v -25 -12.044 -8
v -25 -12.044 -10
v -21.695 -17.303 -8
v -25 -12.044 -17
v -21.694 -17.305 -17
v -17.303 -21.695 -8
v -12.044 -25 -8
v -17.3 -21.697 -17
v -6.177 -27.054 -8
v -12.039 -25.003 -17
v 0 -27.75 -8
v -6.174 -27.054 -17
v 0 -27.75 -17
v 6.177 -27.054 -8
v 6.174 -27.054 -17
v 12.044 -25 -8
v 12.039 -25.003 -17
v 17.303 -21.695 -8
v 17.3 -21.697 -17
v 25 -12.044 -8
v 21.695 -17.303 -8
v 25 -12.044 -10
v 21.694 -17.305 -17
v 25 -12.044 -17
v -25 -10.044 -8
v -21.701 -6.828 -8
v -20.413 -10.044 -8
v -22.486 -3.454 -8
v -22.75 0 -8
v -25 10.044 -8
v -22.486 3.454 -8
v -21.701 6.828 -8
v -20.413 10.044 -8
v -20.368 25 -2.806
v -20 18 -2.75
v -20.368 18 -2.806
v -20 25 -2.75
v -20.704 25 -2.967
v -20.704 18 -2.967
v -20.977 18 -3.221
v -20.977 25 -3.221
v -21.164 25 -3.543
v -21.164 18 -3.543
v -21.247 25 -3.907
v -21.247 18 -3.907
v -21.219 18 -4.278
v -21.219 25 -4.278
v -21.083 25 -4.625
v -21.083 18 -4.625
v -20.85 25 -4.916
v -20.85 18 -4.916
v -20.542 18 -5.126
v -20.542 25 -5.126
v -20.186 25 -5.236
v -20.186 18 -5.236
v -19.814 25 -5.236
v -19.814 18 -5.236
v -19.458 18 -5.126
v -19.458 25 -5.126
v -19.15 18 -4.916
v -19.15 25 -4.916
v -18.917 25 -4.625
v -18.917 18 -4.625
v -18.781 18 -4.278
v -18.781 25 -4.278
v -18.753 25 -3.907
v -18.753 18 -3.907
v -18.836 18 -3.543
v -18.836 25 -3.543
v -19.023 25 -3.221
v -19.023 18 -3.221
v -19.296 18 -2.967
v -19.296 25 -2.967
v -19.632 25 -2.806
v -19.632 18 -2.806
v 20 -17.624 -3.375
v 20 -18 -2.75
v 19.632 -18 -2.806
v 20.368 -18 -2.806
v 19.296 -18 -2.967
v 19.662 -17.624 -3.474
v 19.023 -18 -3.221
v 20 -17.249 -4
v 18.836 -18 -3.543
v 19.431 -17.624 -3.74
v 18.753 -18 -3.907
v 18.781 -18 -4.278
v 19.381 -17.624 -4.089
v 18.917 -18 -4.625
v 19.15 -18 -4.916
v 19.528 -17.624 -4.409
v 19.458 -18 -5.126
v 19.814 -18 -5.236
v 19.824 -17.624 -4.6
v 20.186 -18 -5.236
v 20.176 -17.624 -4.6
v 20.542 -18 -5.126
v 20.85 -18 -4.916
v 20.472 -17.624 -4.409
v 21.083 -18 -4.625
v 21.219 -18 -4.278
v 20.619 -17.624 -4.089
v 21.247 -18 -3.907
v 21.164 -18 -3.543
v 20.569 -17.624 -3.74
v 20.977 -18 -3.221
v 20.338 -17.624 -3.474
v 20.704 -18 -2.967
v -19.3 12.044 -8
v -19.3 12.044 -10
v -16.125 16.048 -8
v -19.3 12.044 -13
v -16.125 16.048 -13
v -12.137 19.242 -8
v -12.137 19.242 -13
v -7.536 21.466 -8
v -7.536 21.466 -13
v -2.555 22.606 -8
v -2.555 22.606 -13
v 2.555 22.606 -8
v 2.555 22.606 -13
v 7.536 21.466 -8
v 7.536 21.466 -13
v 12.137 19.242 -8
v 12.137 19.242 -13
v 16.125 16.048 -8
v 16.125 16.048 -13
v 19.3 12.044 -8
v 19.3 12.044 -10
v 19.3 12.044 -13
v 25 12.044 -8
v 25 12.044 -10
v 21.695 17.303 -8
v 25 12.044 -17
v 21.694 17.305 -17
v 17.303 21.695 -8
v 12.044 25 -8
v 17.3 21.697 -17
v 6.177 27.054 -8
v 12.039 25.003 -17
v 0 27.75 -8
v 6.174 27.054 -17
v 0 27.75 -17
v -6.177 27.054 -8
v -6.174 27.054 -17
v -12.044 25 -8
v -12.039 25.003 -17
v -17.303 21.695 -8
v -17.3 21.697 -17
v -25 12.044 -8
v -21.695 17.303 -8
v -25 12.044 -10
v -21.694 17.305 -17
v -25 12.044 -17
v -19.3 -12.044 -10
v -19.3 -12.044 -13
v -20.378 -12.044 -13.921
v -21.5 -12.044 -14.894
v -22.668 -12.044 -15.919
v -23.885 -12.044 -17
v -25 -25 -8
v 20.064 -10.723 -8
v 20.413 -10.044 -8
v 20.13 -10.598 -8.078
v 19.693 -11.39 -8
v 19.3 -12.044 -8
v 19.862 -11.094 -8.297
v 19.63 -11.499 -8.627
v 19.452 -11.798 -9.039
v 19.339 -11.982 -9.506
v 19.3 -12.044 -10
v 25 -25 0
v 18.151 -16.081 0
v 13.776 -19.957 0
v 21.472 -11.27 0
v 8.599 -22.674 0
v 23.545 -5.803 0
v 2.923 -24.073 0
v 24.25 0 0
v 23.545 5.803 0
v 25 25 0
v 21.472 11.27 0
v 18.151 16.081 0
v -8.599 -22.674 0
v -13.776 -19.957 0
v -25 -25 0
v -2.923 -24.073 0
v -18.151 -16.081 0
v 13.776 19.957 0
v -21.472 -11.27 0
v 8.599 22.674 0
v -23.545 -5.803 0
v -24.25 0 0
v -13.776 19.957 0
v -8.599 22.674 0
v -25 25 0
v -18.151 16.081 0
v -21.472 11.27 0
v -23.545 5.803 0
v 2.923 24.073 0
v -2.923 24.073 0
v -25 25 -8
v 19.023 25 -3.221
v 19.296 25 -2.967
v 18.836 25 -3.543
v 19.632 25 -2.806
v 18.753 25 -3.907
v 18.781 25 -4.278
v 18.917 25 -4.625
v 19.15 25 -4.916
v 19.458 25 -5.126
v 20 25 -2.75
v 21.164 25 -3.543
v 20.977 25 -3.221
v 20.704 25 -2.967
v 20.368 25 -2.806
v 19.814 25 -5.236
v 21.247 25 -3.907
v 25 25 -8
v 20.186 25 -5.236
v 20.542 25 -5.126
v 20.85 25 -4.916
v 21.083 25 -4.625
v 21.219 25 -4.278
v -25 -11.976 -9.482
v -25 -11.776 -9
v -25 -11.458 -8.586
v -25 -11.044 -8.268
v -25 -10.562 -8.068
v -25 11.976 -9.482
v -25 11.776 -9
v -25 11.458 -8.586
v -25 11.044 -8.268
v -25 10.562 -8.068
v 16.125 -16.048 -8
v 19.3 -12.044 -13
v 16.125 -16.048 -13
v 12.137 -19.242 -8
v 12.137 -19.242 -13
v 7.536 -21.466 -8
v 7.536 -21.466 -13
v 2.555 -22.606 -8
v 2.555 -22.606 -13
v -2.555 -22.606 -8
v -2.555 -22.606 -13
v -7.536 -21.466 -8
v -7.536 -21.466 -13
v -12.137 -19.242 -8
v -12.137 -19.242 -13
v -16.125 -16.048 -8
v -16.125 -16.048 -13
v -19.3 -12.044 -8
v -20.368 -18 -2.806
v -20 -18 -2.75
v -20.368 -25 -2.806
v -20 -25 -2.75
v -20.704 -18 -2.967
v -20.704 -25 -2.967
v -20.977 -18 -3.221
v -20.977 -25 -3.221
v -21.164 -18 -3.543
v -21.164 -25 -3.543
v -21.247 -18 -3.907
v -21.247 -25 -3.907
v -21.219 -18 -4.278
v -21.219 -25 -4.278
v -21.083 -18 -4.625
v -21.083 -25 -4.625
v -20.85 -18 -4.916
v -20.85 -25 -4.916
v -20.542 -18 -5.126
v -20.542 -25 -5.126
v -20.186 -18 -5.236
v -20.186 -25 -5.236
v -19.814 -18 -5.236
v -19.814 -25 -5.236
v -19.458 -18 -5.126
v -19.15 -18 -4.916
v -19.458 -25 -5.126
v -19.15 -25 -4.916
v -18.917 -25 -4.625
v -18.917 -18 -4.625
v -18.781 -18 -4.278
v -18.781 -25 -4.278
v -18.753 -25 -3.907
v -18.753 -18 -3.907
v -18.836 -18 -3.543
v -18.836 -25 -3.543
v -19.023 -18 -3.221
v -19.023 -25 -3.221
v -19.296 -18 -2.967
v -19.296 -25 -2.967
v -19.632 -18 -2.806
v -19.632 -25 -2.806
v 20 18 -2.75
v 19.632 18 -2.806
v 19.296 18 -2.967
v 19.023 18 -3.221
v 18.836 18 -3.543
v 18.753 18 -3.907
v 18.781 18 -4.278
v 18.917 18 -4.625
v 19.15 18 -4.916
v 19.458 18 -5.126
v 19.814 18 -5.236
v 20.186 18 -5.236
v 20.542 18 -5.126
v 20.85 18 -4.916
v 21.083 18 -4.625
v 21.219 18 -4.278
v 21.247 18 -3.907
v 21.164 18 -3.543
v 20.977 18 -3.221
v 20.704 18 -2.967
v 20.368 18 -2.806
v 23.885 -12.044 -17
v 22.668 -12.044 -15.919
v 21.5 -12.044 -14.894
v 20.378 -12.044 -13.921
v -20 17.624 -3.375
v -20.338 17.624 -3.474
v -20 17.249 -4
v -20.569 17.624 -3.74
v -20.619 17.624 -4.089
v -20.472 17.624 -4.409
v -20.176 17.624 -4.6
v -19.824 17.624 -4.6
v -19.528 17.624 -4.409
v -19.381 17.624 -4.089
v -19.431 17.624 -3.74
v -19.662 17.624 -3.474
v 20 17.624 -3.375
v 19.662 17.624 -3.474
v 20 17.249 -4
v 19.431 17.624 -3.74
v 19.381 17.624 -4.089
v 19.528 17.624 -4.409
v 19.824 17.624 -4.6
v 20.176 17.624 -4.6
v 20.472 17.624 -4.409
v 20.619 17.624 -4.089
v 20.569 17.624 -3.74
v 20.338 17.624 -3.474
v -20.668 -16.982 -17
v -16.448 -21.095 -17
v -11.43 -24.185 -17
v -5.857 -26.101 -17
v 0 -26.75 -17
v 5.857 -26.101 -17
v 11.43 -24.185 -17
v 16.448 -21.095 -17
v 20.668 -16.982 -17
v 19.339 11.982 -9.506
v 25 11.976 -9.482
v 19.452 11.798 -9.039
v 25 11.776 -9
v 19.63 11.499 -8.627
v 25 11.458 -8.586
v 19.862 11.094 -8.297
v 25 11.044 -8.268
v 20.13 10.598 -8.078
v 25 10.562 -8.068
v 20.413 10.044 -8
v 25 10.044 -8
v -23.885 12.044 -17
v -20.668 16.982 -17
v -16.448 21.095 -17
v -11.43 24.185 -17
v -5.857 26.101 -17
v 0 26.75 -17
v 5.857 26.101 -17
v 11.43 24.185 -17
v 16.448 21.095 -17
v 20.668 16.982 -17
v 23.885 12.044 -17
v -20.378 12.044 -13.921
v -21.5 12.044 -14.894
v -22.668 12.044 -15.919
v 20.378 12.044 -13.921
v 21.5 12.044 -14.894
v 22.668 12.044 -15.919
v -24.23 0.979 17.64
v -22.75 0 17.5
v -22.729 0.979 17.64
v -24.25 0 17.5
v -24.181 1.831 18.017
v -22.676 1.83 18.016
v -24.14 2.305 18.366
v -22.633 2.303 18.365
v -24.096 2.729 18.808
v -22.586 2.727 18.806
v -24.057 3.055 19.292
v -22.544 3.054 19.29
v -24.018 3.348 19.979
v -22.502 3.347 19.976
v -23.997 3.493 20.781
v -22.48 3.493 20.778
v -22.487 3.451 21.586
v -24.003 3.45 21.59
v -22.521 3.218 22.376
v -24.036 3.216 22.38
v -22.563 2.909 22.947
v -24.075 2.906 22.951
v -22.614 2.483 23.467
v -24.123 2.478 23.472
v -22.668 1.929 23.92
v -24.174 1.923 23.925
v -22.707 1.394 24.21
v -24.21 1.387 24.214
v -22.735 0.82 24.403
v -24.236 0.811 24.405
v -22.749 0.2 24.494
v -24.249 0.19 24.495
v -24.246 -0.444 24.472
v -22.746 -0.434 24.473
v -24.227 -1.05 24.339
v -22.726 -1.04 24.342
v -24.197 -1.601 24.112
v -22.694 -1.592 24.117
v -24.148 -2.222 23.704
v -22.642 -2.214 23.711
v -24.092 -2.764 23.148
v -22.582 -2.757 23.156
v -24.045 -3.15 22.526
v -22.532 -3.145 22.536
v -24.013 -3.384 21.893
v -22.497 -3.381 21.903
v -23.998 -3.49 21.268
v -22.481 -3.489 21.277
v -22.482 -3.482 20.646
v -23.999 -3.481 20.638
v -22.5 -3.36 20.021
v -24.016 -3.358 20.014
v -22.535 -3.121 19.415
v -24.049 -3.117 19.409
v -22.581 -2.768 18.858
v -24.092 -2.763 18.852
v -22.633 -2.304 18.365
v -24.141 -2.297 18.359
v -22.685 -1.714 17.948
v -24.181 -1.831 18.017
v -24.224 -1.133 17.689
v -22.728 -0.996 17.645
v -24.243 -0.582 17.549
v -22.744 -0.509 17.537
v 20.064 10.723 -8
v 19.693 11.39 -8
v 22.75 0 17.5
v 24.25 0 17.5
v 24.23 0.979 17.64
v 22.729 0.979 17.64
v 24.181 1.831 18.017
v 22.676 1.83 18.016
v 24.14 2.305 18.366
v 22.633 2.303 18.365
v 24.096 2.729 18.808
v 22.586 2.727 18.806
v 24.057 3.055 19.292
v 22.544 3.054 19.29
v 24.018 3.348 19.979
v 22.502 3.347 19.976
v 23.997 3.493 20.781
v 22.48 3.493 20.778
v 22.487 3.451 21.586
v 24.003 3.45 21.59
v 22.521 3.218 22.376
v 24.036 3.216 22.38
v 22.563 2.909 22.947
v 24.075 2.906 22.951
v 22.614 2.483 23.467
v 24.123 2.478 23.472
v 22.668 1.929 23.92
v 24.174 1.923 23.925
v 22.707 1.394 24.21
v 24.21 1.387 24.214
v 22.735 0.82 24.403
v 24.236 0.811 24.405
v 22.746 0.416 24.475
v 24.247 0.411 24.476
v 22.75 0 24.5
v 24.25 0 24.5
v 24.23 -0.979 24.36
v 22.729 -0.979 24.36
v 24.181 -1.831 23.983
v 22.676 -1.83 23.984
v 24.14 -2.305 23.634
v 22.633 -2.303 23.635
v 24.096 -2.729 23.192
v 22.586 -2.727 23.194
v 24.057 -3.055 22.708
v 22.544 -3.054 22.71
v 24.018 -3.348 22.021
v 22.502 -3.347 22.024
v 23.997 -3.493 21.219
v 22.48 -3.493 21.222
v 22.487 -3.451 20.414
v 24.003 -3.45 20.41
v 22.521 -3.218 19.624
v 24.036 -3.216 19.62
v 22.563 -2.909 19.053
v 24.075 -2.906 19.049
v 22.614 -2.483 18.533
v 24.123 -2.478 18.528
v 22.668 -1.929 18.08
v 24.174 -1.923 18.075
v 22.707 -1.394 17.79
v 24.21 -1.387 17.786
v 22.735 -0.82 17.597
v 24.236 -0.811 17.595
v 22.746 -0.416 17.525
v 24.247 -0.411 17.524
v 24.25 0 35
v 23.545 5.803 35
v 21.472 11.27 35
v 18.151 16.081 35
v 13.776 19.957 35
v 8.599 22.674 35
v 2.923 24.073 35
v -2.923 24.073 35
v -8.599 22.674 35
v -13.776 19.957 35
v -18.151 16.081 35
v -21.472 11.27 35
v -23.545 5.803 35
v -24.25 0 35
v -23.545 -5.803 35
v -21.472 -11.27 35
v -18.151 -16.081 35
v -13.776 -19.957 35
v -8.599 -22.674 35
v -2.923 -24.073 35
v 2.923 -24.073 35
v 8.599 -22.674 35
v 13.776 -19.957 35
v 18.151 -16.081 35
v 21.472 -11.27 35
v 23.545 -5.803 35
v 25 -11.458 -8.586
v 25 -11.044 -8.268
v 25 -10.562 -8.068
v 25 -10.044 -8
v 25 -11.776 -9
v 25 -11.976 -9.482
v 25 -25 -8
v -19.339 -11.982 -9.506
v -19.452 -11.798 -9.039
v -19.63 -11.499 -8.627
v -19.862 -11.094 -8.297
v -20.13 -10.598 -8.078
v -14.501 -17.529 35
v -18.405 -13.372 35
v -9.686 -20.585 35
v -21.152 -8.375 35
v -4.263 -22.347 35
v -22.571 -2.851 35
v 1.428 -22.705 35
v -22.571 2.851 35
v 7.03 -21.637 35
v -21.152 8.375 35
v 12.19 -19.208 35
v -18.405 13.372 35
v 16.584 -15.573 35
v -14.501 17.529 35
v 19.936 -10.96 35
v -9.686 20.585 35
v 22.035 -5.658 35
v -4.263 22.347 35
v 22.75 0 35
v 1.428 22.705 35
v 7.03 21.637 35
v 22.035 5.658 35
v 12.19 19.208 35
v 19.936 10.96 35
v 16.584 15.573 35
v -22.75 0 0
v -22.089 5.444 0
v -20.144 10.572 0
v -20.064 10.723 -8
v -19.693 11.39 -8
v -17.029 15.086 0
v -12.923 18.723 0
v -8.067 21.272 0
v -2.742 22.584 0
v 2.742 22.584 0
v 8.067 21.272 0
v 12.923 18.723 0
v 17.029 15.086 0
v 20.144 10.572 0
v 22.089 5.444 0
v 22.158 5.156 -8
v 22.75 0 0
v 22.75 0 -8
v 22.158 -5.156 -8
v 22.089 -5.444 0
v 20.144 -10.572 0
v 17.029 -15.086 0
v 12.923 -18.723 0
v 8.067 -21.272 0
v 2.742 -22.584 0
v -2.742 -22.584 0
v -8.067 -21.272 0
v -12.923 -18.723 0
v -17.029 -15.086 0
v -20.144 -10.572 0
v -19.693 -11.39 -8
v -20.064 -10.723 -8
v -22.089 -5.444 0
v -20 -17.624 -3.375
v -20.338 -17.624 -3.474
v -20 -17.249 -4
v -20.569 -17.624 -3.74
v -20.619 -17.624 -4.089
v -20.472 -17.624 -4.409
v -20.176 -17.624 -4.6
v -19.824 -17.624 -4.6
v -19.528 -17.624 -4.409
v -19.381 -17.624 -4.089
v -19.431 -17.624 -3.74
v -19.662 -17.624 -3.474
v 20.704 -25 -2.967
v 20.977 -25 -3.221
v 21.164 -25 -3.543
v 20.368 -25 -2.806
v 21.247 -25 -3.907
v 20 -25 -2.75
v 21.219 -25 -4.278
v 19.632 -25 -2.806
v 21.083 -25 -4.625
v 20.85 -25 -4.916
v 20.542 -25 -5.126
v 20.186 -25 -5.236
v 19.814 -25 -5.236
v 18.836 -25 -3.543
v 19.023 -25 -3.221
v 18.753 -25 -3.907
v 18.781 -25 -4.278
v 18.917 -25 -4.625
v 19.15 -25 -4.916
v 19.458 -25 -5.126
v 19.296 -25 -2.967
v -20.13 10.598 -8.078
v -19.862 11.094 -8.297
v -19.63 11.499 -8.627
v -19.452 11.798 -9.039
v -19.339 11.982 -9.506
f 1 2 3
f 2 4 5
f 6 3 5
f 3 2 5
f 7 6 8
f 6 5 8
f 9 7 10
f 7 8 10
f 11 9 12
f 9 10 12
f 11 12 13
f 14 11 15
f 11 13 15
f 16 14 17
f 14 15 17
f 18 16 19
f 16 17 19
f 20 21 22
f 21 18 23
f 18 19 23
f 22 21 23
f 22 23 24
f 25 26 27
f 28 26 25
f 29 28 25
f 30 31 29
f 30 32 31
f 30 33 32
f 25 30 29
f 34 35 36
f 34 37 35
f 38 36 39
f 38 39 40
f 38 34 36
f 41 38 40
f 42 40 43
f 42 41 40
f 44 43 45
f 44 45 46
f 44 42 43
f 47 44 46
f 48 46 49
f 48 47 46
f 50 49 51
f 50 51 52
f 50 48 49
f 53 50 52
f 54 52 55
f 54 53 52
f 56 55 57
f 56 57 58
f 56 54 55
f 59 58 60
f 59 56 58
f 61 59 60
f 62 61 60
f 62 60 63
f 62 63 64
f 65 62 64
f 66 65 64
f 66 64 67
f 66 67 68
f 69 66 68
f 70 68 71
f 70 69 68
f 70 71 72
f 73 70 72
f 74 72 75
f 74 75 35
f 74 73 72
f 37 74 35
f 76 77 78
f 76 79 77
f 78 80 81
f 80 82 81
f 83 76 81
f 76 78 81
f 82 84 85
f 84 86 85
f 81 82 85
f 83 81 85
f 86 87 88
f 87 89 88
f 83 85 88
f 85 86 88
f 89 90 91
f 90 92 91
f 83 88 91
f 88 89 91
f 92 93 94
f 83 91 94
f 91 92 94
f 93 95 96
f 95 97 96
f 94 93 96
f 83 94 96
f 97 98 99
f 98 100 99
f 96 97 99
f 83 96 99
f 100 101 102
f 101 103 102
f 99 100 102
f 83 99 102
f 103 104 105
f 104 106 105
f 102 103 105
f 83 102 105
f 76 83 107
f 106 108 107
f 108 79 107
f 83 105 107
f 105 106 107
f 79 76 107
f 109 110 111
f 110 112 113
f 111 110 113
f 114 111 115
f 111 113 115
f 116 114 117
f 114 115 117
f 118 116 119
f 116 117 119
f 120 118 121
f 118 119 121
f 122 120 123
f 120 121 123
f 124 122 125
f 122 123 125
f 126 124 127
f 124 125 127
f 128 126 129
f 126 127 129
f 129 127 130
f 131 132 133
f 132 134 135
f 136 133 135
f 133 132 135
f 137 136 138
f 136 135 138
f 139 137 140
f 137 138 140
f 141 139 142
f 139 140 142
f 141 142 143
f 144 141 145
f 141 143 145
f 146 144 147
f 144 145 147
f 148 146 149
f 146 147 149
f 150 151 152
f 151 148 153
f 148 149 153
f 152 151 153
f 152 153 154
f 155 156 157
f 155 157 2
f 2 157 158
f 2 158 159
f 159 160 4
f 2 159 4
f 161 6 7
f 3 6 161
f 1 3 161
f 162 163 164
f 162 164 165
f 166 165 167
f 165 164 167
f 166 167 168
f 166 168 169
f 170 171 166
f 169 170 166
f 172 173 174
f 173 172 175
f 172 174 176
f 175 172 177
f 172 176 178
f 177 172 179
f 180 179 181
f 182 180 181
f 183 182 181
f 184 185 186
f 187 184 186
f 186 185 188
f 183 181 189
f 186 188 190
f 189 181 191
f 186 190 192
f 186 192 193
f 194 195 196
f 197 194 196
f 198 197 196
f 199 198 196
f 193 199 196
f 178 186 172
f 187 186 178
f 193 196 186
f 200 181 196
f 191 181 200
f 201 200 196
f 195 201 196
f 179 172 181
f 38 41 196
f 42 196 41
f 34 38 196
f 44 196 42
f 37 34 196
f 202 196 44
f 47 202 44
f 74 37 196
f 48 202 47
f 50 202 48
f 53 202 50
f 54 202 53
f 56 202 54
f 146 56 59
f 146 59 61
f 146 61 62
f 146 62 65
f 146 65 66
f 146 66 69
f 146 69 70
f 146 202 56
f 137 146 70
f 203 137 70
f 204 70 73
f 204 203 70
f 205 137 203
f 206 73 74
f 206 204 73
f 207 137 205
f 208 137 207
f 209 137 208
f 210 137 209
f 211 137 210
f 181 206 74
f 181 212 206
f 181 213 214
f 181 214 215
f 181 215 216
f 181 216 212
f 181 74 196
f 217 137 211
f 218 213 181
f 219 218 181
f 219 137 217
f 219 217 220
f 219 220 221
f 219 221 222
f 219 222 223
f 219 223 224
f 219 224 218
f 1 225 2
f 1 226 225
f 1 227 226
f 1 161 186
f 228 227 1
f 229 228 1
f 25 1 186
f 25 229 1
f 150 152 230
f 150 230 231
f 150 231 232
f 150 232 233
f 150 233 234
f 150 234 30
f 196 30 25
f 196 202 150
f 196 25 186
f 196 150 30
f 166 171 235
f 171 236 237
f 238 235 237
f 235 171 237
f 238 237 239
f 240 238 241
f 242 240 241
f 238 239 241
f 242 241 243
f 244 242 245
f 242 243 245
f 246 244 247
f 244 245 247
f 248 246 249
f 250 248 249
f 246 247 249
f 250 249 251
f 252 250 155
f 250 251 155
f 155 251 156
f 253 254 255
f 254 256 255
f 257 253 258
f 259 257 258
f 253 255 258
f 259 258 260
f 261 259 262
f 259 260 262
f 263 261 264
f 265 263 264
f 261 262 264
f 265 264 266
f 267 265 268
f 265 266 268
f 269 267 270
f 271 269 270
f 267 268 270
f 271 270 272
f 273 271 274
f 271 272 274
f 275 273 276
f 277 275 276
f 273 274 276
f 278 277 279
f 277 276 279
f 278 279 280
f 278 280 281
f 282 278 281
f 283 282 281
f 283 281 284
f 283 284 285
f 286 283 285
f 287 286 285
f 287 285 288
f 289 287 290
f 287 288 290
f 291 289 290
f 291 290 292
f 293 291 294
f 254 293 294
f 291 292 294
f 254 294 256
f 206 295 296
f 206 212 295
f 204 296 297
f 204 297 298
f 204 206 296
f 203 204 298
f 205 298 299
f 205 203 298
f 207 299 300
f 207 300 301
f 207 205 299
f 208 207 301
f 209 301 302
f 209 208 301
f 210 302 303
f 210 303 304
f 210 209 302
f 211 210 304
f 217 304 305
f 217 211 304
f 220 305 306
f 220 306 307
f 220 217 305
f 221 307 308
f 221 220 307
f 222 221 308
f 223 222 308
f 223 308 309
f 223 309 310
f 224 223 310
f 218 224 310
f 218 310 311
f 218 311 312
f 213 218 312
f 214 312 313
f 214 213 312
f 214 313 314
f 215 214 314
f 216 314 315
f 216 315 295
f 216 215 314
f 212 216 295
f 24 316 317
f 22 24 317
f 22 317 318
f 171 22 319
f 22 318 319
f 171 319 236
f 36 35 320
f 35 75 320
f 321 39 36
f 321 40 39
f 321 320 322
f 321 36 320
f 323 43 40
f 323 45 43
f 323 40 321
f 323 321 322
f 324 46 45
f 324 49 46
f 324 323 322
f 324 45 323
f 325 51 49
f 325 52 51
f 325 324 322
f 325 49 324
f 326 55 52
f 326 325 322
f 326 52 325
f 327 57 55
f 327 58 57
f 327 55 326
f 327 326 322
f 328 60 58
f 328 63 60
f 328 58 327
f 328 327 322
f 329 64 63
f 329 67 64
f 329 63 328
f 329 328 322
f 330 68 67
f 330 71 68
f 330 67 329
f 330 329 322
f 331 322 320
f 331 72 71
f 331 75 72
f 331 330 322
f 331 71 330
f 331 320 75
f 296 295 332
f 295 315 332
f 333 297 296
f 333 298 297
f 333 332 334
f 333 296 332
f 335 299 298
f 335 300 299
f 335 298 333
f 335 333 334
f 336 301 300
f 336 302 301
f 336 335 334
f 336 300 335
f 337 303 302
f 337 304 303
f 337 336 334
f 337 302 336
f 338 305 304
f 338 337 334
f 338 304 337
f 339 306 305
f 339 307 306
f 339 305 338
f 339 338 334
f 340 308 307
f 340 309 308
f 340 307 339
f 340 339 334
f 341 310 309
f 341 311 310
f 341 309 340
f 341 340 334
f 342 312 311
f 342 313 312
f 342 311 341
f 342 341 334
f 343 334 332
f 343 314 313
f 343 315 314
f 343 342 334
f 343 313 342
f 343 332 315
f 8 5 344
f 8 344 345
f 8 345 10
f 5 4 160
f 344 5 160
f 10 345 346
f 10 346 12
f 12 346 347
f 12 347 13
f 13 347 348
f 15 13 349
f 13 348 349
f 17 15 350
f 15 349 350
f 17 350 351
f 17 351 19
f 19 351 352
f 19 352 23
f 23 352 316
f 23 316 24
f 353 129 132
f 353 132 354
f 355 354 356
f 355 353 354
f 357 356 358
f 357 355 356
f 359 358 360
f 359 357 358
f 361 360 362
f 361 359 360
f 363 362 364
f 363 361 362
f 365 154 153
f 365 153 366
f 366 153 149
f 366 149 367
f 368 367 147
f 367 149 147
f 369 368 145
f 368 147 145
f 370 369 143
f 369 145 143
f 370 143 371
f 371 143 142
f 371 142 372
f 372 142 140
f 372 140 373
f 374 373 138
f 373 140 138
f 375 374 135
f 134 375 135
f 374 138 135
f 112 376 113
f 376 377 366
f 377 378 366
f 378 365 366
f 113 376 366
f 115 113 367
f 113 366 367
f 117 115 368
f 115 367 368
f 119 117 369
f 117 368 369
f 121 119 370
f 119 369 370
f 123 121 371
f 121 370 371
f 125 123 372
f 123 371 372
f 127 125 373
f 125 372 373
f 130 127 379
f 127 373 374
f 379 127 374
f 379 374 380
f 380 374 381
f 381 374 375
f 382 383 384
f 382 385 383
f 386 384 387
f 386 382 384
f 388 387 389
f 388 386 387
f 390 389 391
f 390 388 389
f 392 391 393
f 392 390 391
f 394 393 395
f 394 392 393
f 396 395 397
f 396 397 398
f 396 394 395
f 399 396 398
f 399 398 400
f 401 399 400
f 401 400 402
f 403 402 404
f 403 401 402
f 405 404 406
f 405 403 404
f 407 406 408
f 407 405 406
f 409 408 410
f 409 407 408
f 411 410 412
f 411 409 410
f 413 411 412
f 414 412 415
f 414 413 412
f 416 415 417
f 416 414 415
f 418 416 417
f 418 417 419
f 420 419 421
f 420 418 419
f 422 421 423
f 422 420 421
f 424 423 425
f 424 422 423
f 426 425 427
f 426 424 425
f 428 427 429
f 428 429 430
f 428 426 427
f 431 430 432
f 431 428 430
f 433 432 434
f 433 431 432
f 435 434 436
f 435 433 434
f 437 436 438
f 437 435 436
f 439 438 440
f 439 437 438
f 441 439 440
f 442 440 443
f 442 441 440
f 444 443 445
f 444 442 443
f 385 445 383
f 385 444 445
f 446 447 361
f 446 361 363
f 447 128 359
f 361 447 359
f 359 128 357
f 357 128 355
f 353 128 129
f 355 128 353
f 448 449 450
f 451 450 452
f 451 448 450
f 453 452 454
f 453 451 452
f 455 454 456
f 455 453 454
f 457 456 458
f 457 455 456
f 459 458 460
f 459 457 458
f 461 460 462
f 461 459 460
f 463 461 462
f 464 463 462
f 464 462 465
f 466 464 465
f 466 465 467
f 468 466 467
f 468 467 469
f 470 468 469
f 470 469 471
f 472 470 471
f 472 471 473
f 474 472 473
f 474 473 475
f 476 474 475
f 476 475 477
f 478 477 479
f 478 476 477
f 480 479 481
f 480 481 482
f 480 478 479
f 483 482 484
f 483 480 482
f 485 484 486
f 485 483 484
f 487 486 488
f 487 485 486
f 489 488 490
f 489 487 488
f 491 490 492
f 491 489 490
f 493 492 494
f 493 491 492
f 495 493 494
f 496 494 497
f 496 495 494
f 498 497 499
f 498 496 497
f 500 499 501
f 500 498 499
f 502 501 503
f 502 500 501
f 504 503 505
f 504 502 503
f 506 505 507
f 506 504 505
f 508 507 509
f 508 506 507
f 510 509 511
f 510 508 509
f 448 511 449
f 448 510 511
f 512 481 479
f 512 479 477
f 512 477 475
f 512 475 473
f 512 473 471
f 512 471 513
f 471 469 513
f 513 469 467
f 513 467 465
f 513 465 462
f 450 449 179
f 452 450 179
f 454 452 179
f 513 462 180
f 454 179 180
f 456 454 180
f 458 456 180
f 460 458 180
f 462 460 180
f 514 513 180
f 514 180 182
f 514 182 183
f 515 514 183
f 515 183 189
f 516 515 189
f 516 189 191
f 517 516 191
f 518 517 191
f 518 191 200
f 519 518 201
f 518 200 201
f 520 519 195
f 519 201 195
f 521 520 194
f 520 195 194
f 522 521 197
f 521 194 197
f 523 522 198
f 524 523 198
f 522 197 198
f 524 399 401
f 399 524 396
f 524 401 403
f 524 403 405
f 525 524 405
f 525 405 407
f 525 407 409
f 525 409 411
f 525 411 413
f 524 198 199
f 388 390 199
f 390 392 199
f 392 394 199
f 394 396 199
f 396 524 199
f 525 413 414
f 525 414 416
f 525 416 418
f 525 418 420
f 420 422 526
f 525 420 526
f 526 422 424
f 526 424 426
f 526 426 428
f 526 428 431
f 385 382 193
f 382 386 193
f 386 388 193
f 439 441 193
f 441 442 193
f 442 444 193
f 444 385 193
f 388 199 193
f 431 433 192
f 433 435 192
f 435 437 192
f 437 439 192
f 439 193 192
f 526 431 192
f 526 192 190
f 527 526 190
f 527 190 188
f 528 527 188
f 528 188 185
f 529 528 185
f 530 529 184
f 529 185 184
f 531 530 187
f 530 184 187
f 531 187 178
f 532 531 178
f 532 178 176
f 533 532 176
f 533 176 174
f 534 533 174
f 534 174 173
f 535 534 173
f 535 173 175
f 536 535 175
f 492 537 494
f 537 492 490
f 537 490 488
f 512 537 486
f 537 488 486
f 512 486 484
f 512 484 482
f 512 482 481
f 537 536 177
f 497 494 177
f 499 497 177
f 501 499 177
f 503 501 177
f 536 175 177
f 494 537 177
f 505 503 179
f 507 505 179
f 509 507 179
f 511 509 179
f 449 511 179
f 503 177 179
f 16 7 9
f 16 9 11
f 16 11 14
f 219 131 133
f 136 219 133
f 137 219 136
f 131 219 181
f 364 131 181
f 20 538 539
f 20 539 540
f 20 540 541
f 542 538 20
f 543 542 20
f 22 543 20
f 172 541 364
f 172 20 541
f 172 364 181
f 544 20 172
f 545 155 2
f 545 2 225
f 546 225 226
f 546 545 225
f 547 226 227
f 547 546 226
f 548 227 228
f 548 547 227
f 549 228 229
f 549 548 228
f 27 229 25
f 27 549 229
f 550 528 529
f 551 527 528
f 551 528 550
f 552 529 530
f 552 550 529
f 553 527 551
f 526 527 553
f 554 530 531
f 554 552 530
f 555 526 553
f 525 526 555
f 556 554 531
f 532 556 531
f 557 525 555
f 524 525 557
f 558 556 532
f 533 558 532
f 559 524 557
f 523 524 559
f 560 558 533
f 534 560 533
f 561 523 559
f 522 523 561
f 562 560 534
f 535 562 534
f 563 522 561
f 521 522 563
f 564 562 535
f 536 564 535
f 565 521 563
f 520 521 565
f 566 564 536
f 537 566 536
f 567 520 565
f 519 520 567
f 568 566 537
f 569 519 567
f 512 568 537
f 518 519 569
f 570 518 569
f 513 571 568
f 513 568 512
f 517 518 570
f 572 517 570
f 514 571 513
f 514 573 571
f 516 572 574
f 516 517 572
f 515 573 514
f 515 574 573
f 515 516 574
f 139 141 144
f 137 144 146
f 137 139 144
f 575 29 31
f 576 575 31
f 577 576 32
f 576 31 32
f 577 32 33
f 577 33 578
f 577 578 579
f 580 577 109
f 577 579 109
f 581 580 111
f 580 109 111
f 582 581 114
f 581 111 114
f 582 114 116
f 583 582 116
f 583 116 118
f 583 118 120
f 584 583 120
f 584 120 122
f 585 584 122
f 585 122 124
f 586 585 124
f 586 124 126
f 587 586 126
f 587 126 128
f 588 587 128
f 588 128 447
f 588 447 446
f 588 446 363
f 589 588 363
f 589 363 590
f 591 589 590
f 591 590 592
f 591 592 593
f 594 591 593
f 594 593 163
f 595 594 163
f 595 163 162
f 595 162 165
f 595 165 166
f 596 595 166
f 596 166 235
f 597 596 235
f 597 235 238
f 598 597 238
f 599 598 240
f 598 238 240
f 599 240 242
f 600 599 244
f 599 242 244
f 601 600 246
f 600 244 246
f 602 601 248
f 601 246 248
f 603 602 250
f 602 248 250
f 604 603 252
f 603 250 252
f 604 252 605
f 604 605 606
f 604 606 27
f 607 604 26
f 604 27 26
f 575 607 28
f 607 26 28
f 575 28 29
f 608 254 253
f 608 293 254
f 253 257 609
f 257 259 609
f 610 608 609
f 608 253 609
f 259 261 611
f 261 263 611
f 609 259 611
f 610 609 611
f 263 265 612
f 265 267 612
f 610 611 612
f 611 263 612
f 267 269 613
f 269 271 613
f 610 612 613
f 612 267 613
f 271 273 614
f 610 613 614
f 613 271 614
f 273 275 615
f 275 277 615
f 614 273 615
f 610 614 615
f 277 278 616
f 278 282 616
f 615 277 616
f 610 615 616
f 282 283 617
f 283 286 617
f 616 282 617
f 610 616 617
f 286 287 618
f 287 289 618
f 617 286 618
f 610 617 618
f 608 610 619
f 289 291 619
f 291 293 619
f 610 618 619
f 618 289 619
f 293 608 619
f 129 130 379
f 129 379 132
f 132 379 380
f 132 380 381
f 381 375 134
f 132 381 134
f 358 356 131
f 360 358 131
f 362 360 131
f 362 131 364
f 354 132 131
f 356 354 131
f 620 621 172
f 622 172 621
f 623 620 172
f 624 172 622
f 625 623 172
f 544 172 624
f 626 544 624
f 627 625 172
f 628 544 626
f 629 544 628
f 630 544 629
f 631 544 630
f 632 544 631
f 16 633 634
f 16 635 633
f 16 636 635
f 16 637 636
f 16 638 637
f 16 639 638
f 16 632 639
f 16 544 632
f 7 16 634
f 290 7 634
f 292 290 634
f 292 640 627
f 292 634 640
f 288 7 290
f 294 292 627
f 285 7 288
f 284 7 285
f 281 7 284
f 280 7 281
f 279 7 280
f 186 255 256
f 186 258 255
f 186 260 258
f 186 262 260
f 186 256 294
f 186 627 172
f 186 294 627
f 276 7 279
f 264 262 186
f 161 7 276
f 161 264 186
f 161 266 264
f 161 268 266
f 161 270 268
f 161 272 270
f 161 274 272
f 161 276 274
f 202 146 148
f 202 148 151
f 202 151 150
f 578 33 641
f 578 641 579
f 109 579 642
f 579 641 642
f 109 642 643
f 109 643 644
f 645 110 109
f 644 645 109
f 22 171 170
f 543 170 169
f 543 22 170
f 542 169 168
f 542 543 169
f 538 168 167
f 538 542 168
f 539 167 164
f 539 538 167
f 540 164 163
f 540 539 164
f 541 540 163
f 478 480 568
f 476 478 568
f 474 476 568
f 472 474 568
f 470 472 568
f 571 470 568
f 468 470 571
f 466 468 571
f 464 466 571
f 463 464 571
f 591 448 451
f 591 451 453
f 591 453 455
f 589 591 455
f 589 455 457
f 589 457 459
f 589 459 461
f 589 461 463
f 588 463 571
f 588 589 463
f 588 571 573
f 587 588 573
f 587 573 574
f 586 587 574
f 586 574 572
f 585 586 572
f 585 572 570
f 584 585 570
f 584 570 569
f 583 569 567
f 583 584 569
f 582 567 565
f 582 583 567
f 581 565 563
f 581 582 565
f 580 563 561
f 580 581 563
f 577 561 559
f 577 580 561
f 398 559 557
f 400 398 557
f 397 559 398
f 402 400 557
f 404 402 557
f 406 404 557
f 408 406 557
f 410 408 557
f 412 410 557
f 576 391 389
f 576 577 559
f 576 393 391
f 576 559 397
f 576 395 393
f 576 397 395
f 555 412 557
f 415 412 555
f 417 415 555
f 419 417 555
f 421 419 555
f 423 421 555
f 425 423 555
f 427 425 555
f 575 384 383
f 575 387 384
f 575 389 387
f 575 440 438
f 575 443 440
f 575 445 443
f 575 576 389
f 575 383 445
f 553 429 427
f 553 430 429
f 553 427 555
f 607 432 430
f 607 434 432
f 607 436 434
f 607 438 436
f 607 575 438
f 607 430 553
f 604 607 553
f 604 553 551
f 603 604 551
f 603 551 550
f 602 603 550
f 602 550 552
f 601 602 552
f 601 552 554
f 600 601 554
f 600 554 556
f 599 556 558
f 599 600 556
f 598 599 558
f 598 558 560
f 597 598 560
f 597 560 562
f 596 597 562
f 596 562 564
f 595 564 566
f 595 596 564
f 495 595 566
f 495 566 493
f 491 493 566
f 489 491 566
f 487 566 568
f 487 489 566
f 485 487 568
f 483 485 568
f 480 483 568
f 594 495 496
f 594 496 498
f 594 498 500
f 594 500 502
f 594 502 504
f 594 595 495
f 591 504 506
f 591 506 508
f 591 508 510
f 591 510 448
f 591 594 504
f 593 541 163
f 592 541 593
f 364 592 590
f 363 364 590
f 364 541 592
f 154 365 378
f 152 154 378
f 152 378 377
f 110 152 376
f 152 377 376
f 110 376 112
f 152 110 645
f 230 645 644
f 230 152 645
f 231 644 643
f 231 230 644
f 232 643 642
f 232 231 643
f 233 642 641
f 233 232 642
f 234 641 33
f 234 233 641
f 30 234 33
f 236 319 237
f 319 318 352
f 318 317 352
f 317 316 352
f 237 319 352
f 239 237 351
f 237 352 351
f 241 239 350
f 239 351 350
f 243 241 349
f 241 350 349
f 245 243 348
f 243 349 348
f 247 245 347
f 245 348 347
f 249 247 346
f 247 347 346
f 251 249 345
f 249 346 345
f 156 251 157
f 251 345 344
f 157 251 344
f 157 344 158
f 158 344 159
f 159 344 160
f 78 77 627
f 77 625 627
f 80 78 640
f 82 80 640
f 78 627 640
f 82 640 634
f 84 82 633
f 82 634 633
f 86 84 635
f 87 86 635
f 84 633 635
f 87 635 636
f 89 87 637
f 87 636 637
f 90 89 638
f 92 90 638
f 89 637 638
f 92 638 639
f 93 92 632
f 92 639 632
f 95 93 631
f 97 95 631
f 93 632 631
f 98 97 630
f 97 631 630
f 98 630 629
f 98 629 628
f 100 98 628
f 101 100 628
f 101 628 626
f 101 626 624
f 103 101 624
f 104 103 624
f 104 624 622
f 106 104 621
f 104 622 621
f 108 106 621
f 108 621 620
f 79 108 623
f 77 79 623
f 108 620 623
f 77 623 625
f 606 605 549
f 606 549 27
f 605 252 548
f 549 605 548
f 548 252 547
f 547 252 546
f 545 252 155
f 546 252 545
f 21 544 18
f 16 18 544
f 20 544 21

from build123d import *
from build123d.topology import SkipClean

# Parameters (mm, degrees)
SKETCH_1_R                  = 24.250000000000004
SKETCH_1_R_2                = 22.75
EXTRUDE_1_DEPTH             = 35
EXTRUDE_START               = 8
SKETCH_2_R                  = 22.75
EXTRUDE_2_DEPTH             = 8
HOLE_WIZARD_M3_1_AT_2_COUNT = 2
HOLE_WIZARD_M3_1_AT_2_PITCH = 40
EXTRUDE_START_2             = 9
EXTRUDE_3_DEPTH             = 9
CUT_EXTRUDE_1_DEPTH         = 52.18654608390758
CUT_EXTRUDE_1_DEPTH_BACK    = 52.18654608390758
SKETCH_6_R                  = 3.5
CHAMFER_2_SIZE              = 4
FILLET_1_R                  = 2


with BuildPart() as part:
    # 草图1 → 凸台-拉伸1 (new body)
    with BuildSketch(Plane.XY):
        Circle(SKETCH_1_R)
        Circle(SKETCH_1_R_2, mode=Mode.SUBTRACT)
    extrude(amount=EXTRUDE_1_DEPTH)

    # 草图2 → 凸台-拉伸2 (add)
    with SkipClean():  # the faces are left unmerged after this step: merging them gives an invalid solid
        with BuildSketch(Plane(origin=(0, 0, 0), x_dir=(-1, 0, 0), z_dir=(0, 0, -1)).offset(EXTRUDE_START)):
            Polygon((-24.999999999999883, -24.999999999999883), (24.999999999999876, -24.999999999999883), (24.999999999999883, 24.999999999999876), (-24.999999999999883, 24.999999999999876), align=None)
            Circle(SKETCH_2_R, mode=Mode.SUBTRACT)
        extrude(amount=-EXTRUDE_2_DEPTH)

    # 草图4 → M3 螺纹孔1 (revolve, cut)
    with SkipClean():  # the faces are left unmerged after this step: merging them gives an invalid solid
        with BuildSketch(Plane(origin=(-20, 24.999999999999876, -4), x_dir=(0, 0, 1), z_dir=(1, 0, 0))):
            Polygon((0, 0), (-1.9e-15, 7.75107577378445), (1.249999999999998, 6.999999999999999), (1.249999999999989, -1.4e-15), align=None)
        hole_wizard_m3_1 = revolve(axis=Axis((-20, 31.349999999999866, -4), (0, -1, 0)), mode=Mode.SUBTRACT)

    # M3 螺纹孔1 at 2: M3 螺纹孔1 ×2
    with SkipClean():  # the faces are left unmerged after this step: merging them gives an invalid solid
        with Locations(*[(i * HOLE_WIZARD_M3_1_AT_2_PITCH, 0, 0) for i in range(1, HOLE_WIZARD_M3_1_AT_2_COUNT)]):
            add(hole_wizard_m3_1, mode=Mode.SUBTRACT)

    # 草图5 → 凸台-拉伸3 (add)
    with SkipClean():  # the faces are left unmerged after this step: merging them gives an invalid solid
        with BuildSketch(Plane(origin=(0, 0, -8), x_dir=(-1, 0, 0), z_dir=(0, 0, -1)).offset(EXTRUDE_START_2)):
            with BuildLine():
                Line((-24.999999999999883, -12.044189470446147), (-19.30025906561863, -12.044189470446147))
                ThreePointArc((-19.30025906561863, -12.044189470446147), (1.39e-15, -22.75), (19.30025906561863, -12.044189470446147))
                Line((19.30025906561863, -12.044189470446147), (24.999999999999883, -12.044189470446147))
                ThreePointArc((24.999999999999883, -12.044189470446147), (1.7e-15, -27.75), (-24.999999999999883, -12.044189470446147))
            make_face()
            with BuildLine():
                Line((24.999999999999883, 12.044189470446147), (19.300259065618633, 12.044189470446147))
                ThreePointArc((19.300259065618633, 12.044189470446147), (6.44e-15, 22.749999999999975), (-19.3002590656186, 12.044189470446147))
                Line((-19.3002590656186, 12.044189470446147), (-24.999999999999854, 12.044189470446147))
                ThreePointArc((-24.999999999999854, 12.044189470446147), (7.86e-15, 27.749999999999975), (24.999999999999883, 12.044189470446147))
            make_face()
        extrude(amount=-EXTRUDE_3_DEPTH)

    # 草图6 → 切除-拉伸1 (cut, two sides: drawn at the far end of the back side and taken through both)
    with SkipClean():  # the faces are left unmerged after this step: merging them gives an invalid solid
        with BuildSketch(Plane(origin=(0, 0, 0), x_dir=(0, 0, -1), z_dir=(1, 0, 0)).offset(-CUT_EXTRUDE_1_DEPTH_BACK)):
            with Locations((-20.999999999999996, 0)):
                Circle(SKETCH_6_R)
        extrude(amount=CUT_EXTRUDE_1_DEPTH + CUT_EXTRUDE_1_DEPTH_BACK, mode=Mode.SUBTRACT)

    # 倒角2
    chamfer_2_edges = [part.edges().sort_by_distance(p)[0] for p in [
        (0, -22.75, -17),
        (-1.599e-14, 22.74999999999998, -17),
    ]]
    chamfer(chamfer_2_edges, length=CHAMFER_2_SIZE)

    # 圆角1
    # the kernel refuses this fillet: 2 mm, written as the material it adds along each edge
    with BuildSketch(Plane(origin=(-14.30025906561863, -12.044189470446147, -8), x_dir=(0, 1, 0), z_dir=(-1, 0, 0))) as fillet_1_piece_1_section:
        with BuildLine():
            CenterArc((FILLET_1_R, FILLET_1_R), FILLET_1_R, 180, 90)
            Line((0, FILLET_1_R), (0, 0))
            Line((0, 0), (FILLET_1_R, 0))
        make_face()
    fillet_1_piece_1 = extrude(amount=10.699740934381254, mode=Mode.PRIVATE)
    fillet_1_piece_1 = fillet_1_piece_1 - Plane(origin=(0, 0, -8.464512968517406), x_dir=(-1, 0, 0), z_dir=(0, 0, -1)) * Cylinder(22.75, 30, mode=Mode.PRIVATE)
    fillet_1_piece_1 = fillet_1_piece_1 & Plane(origin=(0, 0, -8.464512968517406), x_dir=(-0.9009009009008967, -0.43402484578184314, 0), z_dir=(0, 0, -1)) * Cylinder(27.75, 30, mode=Mode.PRIVATE)
    add(fillet_1_piece_1)
    with BuildSketch(Plane(origin=(24.999999999999883, -12.044189470446147, -8), x_dir=(0, 1, 0), z_dir=(-1, 0, 0))) as fillet_1_piece_2_section:
        with BuildLine():
            CenterArc((FILLET_1_R, FILLET_1_R), FILLET_1_R, 180, 90)
            Line((0, FILLET_1_R), (0, 0))
            Line((0, 0), (FILLET_1_R, 0))
        make_face()
    fillet_1_piece_2 = extrude(amount=10.699740934381254, mode=Mode.PRIVATE)
    fillet_1_piece_2 = fillet_1_piece_2 - Plane(origin=(0, 0, -8.464511682363383), x_dir=(-1, 0, 0), z_dir=(0, 0, -1)) * Cylinder(22.75, 30, mode=Mode.PRIVATE)
    fillet_1_piece_2 = fillet_1_piece_2 & Plane(origin=(0, 0, -8.464511682363383), x_dir=(-0.9009009009008967, -0.43402484578184314, 0), z_dir=(0, 0, -1)) * Cylinder(27.75, 30, mode=Mode.PRIVATE)
    add(fillet_1_piece_2)
    with BuildSketch(Plane(origin=(14.3002590656186, 12.044189470446147, -8), x_dir=(0, 0, -1), z_dir=(1, 0, 0))) as fillet_1_piece_3_section:
        with BuildLine():
            CenterArc((FILLET_1_R, -FILLET_1_R), FILLET_1_R, 90, 90)
            Line((0, -FILLET_1_R), (0, 0))
            Line((0, 0), (FILLET_1_R, 0))
        make_face()
    fillet_1_piece_3 = extrude(amount=10.699740934381254, mode=Mode.PRIVATE)
    fillet_1_piece_3 = fillet_1_piece_3 - Plane(origin=(-1.599e-14, -3.197e-14, -8.464512428813396), x_dir=(-0.8483630358513676, 0.5294149217778539, 0), z_dir=(0, 0, -1)) * Cylinder(22.75000000000001, 30, mode=Mode.PRIVATE)
    fillet_1_piece_3 = fillet_1_piece_3 & Plane(origin=(-1.421e-14, -2.487e-14, -8.464512428813396), x_dir=(0.9009009009008963, 0.4340248457818441, 0), z_dir=(0, 0, -1)) * Cylinder(27.75, 30, mode=Mode.PRIVATE)
    add(fillet_1_piece_3)
    with BuildSketch(Plane(origin=(-24.999999999999883, 12.044189470446147, -8), x_dir=(0, 0, -1), z_dir=(1, 0, 0))) as fillet_1_piece_4_section:
        with BuildLine():
            CenterArc((FILLET_1_R, -FILLET_1_R), FILLET_1_R, 90, 90)
            Line((0, -FILLET_1_R), (0, 0))
            Line((0, 0), (FILLET_1_R, 0))
        make_face()
    fillet_1_piece_4 = extrude(amount=10.69974093438125, mode=Mode.PRIVATE)
    fillet_1_piece_4 = fillet_1_piece_4 - Plane(origin=(-1.599e-14, -3.197e-14, -8.464512598097409), x_dir=(-0.8483630358513676, 0.5294149217778539, 0), z_dir=(0, 0, -1)) * Cylinder(22.75000000000001, 30, mode=Mode.PRIVATE)
    fillet_1_piece_4 = fillet_1_piece_4 & Plane(origin=(-1.421e-14, -2.487e-14, -8.464512598097409), x_dir=(0.9009009009008963, 0.4340248457818441, 0), z_dir=(0, 0, -1)) * Cylinder(27.75, 30, mode=Mode.PRIVATE)
    add(fillet_1_piece_4)

    # 镜向1: M3 螺纹孔1 across plane
    add(hole_wizard_m3_1.mirror(Plane.ZX), mode=Mode.SUBTRACT)

    # 镜向1 copy 1 sketch → 镜向1 copy 1 (revolve, cut)
    with BuildSketch(Plane(origin=(20, -24.999999999999876, -4), x_dir=(0, 0, 1), z_dir=(1, 0, 0))):
        Polygon((0, 0), (-1.9e-15, -7.75107577378445), (1.249999999999998, -6.999999999999999), (1.249999999999989, 1.4e-15), align=None)
    revolve(axis=Axis((20, -31.349999999999866, -4), (0, -1, 0)), mode=Mode.SUBTRACT)


solid = part.part
